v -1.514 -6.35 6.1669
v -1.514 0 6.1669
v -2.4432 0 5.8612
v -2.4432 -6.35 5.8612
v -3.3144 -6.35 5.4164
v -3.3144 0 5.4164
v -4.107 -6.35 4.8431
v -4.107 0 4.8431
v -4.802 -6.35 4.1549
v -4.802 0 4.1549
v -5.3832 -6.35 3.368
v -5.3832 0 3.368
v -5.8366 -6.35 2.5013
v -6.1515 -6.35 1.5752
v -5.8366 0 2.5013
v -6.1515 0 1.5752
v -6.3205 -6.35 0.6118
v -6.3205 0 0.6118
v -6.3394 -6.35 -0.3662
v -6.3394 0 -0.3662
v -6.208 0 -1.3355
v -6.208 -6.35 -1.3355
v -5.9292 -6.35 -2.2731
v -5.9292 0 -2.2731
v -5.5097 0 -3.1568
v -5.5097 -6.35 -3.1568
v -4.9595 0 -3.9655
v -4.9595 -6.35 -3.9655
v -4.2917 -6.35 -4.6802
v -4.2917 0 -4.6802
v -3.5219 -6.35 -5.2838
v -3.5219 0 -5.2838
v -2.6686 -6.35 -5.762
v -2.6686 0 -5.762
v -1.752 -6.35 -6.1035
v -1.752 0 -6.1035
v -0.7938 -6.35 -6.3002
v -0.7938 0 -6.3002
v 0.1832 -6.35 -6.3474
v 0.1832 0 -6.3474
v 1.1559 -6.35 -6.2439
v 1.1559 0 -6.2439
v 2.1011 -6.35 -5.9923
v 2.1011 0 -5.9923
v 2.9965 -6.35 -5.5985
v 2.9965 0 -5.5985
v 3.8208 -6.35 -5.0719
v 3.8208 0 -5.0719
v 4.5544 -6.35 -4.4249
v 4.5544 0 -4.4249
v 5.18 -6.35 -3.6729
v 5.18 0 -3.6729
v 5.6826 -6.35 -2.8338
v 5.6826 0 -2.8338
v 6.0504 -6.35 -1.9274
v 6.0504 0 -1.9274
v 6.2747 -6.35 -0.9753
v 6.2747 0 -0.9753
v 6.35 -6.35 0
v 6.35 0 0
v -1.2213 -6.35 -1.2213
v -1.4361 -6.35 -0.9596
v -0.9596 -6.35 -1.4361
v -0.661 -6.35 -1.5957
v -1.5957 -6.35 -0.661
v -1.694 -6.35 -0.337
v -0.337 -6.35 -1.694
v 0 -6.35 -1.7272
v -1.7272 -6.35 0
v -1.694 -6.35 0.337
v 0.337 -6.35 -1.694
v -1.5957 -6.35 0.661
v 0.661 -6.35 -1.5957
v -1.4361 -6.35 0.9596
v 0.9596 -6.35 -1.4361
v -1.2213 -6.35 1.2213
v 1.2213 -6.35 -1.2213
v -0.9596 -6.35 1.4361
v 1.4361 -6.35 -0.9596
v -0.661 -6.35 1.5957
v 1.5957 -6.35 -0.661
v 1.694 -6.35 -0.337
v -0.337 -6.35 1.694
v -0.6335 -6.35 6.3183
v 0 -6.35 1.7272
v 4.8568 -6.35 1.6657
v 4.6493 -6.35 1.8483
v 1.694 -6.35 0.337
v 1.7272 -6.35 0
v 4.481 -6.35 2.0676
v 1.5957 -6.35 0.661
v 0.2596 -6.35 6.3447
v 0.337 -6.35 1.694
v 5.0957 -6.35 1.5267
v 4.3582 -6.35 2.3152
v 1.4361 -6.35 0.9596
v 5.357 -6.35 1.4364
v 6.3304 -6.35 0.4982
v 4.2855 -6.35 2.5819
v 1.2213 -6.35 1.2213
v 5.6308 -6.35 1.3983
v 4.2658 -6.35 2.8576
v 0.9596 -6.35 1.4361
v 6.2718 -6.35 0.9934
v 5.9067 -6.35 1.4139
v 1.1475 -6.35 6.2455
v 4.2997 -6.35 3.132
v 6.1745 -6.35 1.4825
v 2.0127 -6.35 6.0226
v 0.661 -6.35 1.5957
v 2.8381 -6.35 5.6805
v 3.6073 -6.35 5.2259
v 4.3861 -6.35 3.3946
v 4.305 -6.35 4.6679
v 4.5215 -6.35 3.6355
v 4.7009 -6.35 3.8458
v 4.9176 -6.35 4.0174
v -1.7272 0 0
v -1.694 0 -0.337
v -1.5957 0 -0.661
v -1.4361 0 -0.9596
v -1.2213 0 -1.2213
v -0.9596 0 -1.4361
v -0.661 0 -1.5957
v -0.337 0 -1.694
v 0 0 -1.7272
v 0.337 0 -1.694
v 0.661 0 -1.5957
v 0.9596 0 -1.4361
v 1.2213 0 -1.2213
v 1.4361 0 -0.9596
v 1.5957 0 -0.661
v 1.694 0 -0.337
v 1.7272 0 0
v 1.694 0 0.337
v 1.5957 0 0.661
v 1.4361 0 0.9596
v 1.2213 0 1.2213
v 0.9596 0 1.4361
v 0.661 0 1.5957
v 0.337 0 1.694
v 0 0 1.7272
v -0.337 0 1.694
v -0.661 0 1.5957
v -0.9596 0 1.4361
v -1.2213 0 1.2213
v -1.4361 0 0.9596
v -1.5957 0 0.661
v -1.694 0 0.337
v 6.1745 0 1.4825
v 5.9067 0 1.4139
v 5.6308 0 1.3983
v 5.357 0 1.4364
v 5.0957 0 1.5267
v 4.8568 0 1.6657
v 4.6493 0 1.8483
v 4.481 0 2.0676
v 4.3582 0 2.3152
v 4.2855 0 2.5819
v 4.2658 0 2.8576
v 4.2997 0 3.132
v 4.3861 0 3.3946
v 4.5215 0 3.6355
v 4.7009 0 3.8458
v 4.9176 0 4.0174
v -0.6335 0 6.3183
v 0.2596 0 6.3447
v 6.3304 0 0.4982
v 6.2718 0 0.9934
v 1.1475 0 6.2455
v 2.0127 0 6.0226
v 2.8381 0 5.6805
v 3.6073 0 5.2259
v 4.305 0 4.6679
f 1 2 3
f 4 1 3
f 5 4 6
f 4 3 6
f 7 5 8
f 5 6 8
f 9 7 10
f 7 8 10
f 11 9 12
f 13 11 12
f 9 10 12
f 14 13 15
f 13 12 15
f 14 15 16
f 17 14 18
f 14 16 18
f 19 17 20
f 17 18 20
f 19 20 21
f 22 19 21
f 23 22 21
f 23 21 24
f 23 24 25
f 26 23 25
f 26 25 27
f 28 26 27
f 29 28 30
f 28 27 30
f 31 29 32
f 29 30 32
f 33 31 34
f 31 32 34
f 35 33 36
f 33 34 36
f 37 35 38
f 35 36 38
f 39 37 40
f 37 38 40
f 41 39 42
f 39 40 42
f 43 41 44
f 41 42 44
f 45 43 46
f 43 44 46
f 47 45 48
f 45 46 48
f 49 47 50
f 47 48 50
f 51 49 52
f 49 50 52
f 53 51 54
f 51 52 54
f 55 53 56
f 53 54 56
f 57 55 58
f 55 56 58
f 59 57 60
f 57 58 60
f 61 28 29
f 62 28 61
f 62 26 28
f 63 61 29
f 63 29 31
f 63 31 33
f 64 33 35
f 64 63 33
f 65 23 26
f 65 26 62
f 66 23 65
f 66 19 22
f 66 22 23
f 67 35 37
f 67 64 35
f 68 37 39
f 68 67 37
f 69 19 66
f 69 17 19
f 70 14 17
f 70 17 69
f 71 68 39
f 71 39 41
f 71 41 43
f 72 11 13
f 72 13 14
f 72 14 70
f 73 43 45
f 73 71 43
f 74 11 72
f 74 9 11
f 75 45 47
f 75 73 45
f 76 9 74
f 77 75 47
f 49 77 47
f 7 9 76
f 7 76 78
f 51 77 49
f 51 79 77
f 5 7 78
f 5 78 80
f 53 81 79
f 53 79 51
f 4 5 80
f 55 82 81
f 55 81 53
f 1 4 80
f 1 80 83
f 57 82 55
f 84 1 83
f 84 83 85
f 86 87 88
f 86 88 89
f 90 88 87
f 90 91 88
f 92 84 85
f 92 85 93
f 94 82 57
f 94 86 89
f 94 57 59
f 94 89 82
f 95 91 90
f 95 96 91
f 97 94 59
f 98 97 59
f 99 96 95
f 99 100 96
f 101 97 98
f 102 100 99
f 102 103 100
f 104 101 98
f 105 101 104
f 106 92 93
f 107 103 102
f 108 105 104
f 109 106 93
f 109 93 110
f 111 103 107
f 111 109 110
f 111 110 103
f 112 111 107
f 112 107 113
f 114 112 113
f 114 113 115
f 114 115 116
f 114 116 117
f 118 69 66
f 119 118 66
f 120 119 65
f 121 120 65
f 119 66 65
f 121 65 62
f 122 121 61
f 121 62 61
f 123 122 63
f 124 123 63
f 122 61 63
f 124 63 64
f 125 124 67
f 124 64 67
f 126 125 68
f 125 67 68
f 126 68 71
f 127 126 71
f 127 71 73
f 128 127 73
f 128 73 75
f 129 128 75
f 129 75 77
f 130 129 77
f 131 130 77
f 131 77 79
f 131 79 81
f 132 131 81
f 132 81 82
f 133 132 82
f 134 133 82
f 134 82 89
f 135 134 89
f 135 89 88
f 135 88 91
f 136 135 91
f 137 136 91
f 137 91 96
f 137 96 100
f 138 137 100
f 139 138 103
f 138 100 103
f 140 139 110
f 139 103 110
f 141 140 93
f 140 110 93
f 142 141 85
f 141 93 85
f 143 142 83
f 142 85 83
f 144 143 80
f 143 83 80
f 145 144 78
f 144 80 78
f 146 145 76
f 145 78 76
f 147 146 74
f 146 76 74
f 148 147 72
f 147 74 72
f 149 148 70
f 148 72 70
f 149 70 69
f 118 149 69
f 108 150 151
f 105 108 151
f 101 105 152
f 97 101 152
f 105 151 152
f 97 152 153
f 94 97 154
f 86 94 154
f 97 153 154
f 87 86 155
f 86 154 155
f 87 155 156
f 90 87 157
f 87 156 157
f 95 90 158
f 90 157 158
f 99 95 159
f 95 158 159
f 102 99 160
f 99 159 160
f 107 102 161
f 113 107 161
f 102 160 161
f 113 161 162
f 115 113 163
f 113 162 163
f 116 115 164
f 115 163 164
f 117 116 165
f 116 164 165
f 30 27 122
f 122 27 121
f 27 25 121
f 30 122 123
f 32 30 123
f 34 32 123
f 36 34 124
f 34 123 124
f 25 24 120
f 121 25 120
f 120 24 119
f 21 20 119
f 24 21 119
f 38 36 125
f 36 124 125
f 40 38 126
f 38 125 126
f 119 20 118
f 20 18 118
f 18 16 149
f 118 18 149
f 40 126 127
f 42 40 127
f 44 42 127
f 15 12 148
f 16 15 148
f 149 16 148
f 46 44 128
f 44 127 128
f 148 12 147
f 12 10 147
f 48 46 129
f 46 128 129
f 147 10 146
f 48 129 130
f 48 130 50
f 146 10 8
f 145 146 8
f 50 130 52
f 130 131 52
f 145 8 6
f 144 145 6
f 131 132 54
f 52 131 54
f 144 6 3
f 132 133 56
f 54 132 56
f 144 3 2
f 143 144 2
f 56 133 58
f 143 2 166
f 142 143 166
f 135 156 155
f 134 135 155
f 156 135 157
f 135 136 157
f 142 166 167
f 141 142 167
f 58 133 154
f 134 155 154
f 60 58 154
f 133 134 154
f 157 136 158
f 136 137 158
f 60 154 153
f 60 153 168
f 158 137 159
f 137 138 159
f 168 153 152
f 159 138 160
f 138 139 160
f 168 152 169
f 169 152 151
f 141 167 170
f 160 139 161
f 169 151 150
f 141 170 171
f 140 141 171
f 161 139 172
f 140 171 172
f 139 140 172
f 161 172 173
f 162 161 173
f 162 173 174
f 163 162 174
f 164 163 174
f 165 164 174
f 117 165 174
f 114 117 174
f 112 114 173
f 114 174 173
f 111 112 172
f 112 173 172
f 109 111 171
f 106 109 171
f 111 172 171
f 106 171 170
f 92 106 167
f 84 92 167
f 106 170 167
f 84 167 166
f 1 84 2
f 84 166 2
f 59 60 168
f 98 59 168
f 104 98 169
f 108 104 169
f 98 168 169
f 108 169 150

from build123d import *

# Parameters (mm, degrees)
F1_DEPTH = 6.35
F2_D     = 3.4544


with BuildPart() as f1:
    # F0 (on Front) → F1 (new body)
    with BuildSketch(Plane.XZ):
        with BuildLine():
            ThreePointArc((4.9175919376, 4.0174356914), (2.012722134, 6.0225783192), (-1.5140395271, 6.1668617878))
            ThreePointArc((-1.5140395271, 6.1668617878), (-3.9184403149, -4.9968315459), (6.35, 0))
            ThreePointArc((6.35, 0), (6.3059786125, 0.746413919), (6.1745248068, 1.4824788061))
            ThreePointArc((6.1745248068, 1.4824788061), (4.4135292626, 2.1884040834), (4.9175919376, 4.0174356914))
        make_face()
    extrude(amount=F1_DEPTH)

    # F2 (through all)
    with Locations(Plane(origin=(0, 0, 0), x_dir=(1, 0, 0), z_dir=(0, 1, 0))):
        with Locations((0, 0)):
            Hole(F2_D / 2)


solid = f1.part
